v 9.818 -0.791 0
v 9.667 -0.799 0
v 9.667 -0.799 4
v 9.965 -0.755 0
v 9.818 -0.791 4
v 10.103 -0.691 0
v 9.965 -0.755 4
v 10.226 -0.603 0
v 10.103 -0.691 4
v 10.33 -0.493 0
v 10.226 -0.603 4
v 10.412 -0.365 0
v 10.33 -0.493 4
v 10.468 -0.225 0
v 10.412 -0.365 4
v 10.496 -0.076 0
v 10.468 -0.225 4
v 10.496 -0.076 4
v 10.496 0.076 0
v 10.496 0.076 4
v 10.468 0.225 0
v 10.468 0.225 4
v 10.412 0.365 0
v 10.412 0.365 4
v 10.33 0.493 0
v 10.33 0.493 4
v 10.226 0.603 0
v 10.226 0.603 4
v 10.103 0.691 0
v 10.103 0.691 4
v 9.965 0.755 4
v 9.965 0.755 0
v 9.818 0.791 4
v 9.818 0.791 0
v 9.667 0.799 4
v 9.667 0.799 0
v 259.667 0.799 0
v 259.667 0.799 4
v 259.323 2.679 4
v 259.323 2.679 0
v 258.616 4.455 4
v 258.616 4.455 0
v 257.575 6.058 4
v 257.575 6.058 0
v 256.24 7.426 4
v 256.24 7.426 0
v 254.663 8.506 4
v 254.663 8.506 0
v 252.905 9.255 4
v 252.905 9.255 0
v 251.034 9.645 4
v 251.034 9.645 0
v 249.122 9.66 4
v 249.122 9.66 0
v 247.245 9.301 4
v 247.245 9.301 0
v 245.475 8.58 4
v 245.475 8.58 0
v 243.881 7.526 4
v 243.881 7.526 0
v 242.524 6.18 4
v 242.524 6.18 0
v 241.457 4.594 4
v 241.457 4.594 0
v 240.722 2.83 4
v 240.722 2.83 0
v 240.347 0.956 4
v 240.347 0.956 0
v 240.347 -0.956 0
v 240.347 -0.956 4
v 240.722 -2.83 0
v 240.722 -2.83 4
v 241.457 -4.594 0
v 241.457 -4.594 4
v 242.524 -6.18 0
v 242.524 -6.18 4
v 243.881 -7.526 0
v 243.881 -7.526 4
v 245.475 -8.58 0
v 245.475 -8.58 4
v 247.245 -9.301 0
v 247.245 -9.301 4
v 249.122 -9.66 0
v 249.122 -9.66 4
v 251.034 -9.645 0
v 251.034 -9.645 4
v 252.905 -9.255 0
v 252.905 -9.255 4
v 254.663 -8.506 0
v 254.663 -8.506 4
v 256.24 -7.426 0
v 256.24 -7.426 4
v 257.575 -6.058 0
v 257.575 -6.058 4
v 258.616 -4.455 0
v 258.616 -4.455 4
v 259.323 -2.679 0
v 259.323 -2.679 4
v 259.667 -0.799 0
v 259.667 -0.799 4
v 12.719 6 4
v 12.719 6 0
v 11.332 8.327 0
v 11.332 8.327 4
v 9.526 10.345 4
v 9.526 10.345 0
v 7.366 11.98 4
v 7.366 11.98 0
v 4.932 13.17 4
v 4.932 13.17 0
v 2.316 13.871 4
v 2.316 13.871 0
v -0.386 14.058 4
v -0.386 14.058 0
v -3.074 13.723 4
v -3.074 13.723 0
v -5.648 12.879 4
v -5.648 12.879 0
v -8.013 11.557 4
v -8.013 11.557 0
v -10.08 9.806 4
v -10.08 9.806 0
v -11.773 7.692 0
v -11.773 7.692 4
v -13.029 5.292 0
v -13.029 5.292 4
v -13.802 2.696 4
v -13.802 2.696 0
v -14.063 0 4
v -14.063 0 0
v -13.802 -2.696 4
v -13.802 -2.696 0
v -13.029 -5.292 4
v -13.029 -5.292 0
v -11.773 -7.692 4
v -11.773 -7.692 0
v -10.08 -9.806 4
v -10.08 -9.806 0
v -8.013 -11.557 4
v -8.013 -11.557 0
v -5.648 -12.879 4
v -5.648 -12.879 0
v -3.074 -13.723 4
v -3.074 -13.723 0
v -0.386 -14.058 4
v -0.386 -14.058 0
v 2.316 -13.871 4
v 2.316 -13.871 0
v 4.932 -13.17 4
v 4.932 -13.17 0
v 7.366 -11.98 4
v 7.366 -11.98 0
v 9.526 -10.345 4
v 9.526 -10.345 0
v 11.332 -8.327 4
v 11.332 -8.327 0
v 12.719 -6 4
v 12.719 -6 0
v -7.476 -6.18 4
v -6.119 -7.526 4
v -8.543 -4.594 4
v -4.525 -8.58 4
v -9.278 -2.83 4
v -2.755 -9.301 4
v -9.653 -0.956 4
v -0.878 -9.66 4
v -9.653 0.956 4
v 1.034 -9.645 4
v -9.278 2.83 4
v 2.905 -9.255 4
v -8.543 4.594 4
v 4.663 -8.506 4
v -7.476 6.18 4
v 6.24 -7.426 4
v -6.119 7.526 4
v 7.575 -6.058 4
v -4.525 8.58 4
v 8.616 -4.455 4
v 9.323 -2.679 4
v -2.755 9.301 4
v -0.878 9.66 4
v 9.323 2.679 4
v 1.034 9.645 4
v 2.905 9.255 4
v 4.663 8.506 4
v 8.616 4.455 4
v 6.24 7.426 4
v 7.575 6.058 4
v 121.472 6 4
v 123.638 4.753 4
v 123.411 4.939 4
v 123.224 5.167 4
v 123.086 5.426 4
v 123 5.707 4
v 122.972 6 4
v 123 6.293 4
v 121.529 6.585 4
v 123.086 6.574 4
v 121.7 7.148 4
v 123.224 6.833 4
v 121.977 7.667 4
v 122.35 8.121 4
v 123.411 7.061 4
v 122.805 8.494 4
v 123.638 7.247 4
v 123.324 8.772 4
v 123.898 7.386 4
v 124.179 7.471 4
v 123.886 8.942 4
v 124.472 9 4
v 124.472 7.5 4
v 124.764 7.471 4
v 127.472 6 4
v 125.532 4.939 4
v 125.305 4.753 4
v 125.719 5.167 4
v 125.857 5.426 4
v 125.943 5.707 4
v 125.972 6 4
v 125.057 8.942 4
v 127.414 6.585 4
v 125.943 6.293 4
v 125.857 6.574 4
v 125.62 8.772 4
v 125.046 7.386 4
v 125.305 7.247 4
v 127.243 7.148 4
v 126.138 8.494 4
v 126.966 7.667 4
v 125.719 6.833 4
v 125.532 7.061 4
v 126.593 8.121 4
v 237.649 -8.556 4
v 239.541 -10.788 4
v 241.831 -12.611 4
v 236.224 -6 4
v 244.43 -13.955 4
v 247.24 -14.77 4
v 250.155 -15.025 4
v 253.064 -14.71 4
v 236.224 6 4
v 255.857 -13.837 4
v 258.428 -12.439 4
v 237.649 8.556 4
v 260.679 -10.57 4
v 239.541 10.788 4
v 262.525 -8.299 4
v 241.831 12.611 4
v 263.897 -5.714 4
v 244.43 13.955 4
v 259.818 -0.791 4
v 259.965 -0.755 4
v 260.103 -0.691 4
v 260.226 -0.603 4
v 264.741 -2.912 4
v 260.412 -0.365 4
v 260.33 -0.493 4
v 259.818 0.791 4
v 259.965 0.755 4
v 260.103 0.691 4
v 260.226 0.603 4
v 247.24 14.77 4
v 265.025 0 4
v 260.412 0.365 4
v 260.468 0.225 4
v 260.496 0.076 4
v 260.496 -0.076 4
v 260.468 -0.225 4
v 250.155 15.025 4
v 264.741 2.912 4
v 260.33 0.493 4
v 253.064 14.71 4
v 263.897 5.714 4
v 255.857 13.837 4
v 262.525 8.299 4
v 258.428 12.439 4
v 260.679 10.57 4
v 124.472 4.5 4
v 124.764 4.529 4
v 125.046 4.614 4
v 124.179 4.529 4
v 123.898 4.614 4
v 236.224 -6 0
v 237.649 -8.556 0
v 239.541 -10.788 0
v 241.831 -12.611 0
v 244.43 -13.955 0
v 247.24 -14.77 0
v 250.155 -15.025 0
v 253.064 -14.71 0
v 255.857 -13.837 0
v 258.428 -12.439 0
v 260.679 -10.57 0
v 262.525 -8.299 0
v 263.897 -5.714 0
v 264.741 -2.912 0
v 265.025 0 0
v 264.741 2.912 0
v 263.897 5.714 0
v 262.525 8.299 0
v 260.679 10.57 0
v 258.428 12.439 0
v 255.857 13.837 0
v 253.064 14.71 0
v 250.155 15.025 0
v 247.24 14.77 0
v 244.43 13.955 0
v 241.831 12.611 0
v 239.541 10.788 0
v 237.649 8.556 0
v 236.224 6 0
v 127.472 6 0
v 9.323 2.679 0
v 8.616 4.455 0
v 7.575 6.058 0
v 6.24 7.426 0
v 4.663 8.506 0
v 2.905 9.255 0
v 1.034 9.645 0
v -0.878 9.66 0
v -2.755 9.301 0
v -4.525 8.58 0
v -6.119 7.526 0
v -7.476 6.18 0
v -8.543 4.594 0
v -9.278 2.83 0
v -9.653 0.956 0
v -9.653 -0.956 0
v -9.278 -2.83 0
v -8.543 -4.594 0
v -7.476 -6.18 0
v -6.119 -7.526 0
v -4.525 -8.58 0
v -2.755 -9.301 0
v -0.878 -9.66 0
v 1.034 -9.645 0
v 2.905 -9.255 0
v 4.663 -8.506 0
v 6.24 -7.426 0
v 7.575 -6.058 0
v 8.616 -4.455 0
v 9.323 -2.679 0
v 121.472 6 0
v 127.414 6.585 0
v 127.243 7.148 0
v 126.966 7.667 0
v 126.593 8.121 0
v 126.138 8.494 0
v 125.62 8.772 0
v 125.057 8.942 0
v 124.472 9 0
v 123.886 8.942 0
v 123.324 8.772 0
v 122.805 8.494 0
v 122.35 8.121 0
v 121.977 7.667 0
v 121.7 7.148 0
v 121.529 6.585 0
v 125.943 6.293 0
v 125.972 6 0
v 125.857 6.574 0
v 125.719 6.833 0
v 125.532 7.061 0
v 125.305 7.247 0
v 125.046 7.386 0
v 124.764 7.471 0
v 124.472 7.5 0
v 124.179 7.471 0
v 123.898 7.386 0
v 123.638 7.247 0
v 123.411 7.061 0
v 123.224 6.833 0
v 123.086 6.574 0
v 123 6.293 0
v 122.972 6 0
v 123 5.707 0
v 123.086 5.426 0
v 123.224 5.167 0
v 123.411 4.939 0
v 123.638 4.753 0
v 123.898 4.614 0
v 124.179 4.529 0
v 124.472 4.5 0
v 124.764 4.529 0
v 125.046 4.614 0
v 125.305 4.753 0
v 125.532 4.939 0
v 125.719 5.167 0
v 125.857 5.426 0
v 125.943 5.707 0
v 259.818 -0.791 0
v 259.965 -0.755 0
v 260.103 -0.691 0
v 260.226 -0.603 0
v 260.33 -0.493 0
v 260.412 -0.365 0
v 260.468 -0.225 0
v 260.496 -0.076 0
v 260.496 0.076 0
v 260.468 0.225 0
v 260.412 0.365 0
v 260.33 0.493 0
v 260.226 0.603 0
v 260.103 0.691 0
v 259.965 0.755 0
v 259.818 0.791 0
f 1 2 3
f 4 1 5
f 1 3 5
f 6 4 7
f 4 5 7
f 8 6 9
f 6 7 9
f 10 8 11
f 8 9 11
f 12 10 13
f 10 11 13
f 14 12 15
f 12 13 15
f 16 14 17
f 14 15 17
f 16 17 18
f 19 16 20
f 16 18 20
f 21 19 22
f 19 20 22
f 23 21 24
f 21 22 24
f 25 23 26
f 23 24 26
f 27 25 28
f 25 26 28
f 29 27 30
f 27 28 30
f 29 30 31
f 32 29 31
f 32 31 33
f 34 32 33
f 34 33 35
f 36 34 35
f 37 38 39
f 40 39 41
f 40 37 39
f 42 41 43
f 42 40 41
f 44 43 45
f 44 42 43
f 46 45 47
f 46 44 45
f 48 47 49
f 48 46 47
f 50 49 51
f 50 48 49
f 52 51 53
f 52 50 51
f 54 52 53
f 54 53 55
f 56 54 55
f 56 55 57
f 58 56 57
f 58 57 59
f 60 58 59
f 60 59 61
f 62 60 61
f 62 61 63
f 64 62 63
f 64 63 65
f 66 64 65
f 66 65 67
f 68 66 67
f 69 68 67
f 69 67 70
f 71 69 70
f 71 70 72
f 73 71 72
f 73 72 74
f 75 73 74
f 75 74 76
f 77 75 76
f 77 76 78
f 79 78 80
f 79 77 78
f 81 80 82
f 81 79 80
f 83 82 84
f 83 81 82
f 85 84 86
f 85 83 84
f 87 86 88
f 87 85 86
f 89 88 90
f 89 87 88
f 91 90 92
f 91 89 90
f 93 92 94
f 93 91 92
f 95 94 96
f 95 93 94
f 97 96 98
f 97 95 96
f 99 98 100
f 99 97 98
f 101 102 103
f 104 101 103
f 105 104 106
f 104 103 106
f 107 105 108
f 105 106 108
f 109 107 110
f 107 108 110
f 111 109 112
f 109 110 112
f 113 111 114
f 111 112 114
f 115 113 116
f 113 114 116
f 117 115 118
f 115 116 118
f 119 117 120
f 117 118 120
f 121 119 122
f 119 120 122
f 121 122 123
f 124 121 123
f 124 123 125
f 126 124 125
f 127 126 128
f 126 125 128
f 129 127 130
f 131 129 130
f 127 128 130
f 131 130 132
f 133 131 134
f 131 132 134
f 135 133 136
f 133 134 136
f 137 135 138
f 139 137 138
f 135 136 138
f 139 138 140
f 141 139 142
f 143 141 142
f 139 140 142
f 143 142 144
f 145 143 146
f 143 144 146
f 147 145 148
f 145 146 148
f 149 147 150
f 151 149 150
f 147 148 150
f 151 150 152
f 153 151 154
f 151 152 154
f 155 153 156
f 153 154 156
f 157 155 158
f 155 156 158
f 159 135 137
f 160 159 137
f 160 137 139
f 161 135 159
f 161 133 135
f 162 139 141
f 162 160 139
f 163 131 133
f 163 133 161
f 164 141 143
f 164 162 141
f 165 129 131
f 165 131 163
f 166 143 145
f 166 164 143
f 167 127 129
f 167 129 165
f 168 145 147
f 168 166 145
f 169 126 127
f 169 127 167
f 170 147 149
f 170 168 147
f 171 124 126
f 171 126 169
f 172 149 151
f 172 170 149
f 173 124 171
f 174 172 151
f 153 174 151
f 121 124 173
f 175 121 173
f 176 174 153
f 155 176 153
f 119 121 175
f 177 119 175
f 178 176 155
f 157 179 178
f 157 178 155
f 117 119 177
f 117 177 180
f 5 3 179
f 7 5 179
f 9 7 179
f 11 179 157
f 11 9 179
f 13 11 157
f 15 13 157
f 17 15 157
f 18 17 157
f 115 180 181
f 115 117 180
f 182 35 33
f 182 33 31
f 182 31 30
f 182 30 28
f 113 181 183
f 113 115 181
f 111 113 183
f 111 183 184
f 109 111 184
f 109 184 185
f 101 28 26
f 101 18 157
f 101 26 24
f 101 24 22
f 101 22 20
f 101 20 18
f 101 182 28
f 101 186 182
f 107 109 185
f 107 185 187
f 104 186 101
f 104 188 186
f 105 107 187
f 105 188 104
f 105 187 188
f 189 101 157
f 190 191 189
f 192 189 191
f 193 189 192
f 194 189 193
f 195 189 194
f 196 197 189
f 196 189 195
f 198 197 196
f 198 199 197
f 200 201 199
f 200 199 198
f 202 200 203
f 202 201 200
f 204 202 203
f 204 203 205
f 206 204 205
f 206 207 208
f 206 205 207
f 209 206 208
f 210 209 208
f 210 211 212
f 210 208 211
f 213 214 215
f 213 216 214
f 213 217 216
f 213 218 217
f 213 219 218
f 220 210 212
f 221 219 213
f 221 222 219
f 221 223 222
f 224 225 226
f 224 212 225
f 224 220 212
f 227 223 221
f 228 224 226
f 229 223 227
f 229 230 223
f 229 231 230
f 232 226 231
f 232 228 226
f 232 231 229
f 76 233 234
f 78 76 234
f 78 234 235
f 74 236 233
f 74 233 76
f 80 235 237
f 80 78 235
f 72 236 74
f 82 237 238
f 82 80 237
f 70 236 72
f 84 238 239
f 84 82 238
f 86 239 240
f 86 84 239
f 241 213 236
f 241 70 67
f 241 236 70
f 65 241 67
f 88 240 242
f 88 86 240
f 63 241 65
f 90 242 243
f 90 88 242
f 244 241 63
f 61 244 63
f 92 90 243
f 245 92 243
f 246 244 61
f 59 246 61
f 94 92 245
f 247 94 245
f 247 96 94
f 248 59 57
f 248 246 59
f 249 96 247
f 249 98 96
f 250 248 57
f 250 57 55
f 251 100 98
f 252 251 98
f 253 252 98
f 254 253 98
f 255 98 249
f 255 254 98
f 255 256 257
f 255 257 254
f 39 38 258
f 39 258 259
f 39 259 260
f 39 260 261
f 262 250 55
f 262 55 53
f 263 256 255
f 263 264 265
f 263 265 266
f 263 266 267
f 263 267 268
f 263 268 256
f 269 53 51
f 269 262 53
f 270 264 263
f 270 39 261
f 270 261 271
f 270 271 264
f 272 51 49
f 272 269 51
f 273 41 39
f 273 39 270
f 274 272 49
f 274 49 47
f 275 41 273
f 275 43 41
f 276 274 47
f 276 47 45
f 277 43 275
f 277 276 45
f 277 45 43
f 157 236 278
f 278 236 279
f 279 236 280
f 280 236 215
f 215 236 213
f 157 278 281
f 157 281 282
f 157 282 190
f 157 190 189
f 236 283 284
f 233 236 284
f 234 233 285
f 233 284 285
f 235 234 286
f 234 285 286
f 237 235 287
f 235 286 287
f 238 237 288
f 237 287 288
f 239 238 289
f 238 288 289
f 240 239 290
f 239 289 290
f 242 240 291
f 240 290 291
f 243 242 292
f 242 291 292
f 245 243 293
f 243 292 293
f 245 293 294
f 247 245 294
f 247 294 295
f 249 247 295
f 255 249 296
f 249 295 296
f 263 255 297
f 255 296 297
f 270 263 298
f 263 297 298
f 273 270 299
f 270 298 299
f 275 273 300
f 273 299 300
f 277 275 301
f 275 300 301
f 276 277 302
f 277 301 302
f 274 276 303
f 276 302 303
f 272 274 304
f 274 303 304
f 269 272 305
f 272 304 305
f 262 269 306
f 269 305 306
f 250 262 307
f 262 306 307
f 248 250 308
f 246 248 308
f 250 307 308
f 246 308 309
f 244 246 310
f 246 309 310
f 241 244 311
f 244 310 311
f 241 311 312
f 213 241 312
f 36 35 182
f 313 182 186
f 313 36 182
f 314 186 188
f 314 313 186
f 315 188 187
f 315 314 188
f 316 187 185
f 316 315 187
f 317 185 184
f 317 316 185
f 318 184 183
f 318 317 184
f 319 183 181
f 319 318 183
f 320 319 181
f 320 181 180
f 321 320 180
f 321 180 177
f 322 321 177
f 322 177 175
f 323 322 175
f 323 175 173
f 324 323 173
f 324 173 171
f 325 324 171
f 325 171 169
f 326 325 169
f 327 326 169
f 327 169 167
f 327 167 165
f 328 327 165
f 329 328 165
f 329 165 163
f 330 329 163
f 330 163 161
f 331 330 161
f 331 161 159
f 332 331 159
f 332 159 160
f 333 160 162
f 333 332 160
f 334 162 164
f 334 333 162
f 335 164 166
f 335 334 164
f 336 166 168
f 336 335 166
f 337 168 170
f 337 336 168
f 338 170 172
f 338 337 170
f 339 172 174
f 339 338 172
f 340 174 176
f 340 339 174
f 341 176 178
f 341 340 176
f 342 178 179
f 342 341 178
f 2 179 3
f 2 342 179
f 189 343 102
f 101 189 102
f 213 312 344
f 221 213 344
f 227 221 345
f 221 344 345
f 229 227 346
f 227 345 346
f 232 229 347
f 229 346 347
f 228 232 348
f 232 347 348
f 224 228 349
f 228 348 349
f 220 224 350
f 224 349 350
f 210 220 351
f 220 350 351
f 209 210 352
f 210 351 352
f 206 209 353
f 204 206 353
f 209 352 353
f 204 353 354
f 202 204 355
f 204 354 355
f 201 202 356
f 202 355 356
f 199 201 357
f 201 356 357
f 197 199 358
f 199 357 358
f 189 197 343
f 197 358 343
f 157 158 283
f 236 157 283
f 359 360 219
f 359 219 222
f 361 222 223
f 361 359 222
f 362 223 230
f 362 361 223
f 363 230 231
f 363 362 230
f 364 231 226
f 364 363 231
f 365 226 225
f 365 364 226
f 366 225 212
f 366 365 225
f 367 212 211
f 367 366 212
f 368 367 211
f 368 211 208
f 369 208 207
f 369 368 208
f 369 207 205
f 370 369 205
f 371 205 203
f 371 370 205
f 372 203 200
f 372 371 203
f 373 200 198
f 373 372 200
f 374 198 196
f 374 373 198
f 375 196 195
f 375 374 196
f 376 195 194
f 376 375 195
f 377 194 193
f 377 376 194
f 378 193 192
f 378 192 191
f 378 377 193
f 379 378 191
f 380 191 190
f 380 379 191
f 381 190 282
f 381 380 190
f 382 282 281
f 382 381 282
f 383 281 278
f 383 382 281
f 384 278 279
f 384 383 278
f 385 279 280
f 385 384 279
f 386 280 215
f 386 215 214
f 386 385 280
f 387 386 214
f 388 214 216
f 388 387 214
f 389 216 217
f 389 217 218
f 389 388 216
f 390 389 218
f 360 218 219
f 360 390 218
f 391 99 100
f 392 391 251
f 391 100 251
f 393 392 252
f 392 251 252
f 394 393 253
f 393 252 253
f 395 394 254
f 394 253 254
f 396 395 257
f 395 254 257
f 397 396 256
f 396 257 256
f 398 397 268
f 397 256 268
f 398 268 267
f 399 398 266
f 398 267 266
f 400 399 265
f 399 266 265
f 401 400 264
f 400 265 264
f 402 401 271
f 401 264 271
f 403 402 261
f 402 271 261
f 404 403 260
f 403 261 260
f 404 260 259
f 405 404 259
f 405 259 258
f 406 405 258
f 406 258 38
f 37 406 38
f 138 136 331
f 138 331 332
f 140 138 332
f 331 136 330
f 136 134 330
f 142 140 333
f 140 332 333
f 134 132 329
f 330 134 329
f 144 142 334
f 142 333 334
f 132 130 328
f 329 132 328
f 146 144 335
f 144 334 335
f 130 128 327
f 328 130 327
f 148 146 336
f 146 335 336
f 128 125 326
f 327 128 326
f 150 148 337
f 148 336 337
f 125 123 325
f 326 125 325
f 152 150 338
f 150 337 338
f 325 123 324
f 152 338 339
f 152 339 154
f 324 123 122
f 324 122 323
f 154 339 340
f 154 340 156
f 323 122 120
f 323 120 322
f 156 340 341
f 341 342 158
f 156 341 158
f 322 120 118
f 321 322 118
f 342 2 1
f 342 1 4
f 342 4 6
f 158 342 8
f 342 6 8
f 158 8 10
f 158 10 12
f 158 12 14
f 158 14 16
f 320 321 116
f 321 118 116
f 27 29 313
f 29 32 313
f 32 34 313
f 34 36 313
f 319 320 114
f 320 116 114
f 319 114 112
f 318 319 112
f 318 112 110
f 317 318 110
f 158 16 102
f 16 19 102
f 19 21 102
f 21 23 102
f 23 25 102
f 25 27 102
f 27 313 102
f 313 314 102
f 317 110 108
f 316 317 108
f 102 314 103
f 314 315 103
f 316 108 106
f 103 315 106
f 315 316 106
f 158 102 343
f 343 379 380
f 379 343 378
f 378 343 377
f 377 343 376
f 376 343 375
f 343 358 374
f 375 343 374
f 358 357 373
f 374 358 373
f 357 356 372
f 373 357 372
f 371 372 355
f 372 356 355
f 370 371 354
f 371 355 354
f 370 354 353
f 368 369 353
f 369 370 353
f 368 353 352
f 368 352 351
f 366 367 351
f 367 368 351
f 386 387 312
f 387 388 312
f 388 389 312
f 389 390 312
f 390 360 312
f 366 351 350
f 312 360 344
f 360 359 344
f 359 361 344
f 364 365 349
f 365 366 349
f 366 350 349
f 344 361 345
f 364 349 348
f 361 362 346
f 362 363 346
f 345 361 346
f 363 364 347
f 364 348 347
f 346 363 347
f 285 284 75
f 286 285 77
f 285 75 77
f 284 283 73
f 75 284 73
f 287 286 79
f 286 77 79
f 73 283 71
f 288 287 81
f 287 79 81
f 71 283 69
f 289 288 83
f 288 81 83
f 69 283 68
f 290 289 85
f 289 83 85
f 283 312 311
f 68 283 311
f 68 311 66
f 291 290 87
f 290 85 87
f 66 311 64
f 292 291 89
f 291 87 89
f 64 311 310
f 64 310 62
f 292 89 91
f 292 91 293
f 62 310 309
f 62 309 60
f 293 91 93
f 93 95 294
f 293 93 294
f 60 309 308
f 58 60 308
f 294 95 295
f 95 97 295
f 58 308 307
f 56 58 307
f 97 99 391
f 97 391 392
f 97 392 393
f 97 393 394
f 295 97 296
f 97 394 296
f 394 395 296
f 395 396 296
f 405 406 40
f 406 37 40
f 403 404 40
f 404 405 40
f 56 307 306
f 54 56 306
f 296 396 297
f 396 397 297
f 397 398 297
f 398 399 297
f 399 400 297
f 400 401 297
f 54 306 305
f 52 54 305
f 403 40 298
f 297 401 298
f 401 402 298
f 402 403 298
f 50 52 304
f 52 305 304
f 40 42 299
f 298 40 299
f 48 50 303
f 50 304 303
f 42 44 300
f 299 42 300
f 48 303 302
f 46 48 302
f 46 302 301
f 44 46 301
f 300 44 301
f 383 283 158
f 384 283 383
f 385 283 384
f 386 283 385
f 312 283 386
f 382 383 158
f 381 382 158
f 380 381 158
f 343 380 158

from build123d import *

# Parameters (mm, degrees)
SKETCH_1_R          = 9.7
SKETCH_1_R_2        = 1.5
EXTRUDE_1_DEPTH     = 4
SKETCH_3_R          = 0.8
CUT_EXTRUDE_1_DEPTH = 10


with BuildPart() as part:
    # 草图1 → 凸台-拉伸1 (new body)
    with BuildSketch(Plane.XY):
        with BuildLine():
            ThreePointArc((12.718684308, 6), (-14.062891969, 0), (12.718684308, -6))
            Line((12.718684308, -6), (236.224480753, -6))
            ThreePointArc((236.224480753, -6), (265.02547605, 0), (236.224480753, 6))
            Line((236.224480753, 6), (127.47158253, 6))
            ThreePointArc((127.47158253, 6), (124.47158253, 9), (121.47158253, 6))
            Line((121.47158253, 6), (12.718684308, 6))
        make_face()
        Circle(SKETCH_1_R, mode=Mode.SUBTRACT)
        with Locations((250, 0)):
            Circle(SKETCH_1_R, mode=Mode.SUBTRACT)
        with Locations((124.47158253, 6)):
            Circle(SKETCH_1_R_2, mode=Mode.SUBTRACT)
    extrude(amount=EXTRUDE_1_DEPTH)

    # 草图3 → 切除-拉伸1 (cut)
    with BuildSketch(Plane.XY.offset(4)):
        with Locations((9.7, 0)):
            Circle(SKETCH_3_R)
        with Locations((259.7, 0)):
            Circle(SKETCH_3_R)
    extrude(amount=-CUT_EXTRUDE_1_DEPTH, mode=Mode.SUBTRACT)


solid = part.part
